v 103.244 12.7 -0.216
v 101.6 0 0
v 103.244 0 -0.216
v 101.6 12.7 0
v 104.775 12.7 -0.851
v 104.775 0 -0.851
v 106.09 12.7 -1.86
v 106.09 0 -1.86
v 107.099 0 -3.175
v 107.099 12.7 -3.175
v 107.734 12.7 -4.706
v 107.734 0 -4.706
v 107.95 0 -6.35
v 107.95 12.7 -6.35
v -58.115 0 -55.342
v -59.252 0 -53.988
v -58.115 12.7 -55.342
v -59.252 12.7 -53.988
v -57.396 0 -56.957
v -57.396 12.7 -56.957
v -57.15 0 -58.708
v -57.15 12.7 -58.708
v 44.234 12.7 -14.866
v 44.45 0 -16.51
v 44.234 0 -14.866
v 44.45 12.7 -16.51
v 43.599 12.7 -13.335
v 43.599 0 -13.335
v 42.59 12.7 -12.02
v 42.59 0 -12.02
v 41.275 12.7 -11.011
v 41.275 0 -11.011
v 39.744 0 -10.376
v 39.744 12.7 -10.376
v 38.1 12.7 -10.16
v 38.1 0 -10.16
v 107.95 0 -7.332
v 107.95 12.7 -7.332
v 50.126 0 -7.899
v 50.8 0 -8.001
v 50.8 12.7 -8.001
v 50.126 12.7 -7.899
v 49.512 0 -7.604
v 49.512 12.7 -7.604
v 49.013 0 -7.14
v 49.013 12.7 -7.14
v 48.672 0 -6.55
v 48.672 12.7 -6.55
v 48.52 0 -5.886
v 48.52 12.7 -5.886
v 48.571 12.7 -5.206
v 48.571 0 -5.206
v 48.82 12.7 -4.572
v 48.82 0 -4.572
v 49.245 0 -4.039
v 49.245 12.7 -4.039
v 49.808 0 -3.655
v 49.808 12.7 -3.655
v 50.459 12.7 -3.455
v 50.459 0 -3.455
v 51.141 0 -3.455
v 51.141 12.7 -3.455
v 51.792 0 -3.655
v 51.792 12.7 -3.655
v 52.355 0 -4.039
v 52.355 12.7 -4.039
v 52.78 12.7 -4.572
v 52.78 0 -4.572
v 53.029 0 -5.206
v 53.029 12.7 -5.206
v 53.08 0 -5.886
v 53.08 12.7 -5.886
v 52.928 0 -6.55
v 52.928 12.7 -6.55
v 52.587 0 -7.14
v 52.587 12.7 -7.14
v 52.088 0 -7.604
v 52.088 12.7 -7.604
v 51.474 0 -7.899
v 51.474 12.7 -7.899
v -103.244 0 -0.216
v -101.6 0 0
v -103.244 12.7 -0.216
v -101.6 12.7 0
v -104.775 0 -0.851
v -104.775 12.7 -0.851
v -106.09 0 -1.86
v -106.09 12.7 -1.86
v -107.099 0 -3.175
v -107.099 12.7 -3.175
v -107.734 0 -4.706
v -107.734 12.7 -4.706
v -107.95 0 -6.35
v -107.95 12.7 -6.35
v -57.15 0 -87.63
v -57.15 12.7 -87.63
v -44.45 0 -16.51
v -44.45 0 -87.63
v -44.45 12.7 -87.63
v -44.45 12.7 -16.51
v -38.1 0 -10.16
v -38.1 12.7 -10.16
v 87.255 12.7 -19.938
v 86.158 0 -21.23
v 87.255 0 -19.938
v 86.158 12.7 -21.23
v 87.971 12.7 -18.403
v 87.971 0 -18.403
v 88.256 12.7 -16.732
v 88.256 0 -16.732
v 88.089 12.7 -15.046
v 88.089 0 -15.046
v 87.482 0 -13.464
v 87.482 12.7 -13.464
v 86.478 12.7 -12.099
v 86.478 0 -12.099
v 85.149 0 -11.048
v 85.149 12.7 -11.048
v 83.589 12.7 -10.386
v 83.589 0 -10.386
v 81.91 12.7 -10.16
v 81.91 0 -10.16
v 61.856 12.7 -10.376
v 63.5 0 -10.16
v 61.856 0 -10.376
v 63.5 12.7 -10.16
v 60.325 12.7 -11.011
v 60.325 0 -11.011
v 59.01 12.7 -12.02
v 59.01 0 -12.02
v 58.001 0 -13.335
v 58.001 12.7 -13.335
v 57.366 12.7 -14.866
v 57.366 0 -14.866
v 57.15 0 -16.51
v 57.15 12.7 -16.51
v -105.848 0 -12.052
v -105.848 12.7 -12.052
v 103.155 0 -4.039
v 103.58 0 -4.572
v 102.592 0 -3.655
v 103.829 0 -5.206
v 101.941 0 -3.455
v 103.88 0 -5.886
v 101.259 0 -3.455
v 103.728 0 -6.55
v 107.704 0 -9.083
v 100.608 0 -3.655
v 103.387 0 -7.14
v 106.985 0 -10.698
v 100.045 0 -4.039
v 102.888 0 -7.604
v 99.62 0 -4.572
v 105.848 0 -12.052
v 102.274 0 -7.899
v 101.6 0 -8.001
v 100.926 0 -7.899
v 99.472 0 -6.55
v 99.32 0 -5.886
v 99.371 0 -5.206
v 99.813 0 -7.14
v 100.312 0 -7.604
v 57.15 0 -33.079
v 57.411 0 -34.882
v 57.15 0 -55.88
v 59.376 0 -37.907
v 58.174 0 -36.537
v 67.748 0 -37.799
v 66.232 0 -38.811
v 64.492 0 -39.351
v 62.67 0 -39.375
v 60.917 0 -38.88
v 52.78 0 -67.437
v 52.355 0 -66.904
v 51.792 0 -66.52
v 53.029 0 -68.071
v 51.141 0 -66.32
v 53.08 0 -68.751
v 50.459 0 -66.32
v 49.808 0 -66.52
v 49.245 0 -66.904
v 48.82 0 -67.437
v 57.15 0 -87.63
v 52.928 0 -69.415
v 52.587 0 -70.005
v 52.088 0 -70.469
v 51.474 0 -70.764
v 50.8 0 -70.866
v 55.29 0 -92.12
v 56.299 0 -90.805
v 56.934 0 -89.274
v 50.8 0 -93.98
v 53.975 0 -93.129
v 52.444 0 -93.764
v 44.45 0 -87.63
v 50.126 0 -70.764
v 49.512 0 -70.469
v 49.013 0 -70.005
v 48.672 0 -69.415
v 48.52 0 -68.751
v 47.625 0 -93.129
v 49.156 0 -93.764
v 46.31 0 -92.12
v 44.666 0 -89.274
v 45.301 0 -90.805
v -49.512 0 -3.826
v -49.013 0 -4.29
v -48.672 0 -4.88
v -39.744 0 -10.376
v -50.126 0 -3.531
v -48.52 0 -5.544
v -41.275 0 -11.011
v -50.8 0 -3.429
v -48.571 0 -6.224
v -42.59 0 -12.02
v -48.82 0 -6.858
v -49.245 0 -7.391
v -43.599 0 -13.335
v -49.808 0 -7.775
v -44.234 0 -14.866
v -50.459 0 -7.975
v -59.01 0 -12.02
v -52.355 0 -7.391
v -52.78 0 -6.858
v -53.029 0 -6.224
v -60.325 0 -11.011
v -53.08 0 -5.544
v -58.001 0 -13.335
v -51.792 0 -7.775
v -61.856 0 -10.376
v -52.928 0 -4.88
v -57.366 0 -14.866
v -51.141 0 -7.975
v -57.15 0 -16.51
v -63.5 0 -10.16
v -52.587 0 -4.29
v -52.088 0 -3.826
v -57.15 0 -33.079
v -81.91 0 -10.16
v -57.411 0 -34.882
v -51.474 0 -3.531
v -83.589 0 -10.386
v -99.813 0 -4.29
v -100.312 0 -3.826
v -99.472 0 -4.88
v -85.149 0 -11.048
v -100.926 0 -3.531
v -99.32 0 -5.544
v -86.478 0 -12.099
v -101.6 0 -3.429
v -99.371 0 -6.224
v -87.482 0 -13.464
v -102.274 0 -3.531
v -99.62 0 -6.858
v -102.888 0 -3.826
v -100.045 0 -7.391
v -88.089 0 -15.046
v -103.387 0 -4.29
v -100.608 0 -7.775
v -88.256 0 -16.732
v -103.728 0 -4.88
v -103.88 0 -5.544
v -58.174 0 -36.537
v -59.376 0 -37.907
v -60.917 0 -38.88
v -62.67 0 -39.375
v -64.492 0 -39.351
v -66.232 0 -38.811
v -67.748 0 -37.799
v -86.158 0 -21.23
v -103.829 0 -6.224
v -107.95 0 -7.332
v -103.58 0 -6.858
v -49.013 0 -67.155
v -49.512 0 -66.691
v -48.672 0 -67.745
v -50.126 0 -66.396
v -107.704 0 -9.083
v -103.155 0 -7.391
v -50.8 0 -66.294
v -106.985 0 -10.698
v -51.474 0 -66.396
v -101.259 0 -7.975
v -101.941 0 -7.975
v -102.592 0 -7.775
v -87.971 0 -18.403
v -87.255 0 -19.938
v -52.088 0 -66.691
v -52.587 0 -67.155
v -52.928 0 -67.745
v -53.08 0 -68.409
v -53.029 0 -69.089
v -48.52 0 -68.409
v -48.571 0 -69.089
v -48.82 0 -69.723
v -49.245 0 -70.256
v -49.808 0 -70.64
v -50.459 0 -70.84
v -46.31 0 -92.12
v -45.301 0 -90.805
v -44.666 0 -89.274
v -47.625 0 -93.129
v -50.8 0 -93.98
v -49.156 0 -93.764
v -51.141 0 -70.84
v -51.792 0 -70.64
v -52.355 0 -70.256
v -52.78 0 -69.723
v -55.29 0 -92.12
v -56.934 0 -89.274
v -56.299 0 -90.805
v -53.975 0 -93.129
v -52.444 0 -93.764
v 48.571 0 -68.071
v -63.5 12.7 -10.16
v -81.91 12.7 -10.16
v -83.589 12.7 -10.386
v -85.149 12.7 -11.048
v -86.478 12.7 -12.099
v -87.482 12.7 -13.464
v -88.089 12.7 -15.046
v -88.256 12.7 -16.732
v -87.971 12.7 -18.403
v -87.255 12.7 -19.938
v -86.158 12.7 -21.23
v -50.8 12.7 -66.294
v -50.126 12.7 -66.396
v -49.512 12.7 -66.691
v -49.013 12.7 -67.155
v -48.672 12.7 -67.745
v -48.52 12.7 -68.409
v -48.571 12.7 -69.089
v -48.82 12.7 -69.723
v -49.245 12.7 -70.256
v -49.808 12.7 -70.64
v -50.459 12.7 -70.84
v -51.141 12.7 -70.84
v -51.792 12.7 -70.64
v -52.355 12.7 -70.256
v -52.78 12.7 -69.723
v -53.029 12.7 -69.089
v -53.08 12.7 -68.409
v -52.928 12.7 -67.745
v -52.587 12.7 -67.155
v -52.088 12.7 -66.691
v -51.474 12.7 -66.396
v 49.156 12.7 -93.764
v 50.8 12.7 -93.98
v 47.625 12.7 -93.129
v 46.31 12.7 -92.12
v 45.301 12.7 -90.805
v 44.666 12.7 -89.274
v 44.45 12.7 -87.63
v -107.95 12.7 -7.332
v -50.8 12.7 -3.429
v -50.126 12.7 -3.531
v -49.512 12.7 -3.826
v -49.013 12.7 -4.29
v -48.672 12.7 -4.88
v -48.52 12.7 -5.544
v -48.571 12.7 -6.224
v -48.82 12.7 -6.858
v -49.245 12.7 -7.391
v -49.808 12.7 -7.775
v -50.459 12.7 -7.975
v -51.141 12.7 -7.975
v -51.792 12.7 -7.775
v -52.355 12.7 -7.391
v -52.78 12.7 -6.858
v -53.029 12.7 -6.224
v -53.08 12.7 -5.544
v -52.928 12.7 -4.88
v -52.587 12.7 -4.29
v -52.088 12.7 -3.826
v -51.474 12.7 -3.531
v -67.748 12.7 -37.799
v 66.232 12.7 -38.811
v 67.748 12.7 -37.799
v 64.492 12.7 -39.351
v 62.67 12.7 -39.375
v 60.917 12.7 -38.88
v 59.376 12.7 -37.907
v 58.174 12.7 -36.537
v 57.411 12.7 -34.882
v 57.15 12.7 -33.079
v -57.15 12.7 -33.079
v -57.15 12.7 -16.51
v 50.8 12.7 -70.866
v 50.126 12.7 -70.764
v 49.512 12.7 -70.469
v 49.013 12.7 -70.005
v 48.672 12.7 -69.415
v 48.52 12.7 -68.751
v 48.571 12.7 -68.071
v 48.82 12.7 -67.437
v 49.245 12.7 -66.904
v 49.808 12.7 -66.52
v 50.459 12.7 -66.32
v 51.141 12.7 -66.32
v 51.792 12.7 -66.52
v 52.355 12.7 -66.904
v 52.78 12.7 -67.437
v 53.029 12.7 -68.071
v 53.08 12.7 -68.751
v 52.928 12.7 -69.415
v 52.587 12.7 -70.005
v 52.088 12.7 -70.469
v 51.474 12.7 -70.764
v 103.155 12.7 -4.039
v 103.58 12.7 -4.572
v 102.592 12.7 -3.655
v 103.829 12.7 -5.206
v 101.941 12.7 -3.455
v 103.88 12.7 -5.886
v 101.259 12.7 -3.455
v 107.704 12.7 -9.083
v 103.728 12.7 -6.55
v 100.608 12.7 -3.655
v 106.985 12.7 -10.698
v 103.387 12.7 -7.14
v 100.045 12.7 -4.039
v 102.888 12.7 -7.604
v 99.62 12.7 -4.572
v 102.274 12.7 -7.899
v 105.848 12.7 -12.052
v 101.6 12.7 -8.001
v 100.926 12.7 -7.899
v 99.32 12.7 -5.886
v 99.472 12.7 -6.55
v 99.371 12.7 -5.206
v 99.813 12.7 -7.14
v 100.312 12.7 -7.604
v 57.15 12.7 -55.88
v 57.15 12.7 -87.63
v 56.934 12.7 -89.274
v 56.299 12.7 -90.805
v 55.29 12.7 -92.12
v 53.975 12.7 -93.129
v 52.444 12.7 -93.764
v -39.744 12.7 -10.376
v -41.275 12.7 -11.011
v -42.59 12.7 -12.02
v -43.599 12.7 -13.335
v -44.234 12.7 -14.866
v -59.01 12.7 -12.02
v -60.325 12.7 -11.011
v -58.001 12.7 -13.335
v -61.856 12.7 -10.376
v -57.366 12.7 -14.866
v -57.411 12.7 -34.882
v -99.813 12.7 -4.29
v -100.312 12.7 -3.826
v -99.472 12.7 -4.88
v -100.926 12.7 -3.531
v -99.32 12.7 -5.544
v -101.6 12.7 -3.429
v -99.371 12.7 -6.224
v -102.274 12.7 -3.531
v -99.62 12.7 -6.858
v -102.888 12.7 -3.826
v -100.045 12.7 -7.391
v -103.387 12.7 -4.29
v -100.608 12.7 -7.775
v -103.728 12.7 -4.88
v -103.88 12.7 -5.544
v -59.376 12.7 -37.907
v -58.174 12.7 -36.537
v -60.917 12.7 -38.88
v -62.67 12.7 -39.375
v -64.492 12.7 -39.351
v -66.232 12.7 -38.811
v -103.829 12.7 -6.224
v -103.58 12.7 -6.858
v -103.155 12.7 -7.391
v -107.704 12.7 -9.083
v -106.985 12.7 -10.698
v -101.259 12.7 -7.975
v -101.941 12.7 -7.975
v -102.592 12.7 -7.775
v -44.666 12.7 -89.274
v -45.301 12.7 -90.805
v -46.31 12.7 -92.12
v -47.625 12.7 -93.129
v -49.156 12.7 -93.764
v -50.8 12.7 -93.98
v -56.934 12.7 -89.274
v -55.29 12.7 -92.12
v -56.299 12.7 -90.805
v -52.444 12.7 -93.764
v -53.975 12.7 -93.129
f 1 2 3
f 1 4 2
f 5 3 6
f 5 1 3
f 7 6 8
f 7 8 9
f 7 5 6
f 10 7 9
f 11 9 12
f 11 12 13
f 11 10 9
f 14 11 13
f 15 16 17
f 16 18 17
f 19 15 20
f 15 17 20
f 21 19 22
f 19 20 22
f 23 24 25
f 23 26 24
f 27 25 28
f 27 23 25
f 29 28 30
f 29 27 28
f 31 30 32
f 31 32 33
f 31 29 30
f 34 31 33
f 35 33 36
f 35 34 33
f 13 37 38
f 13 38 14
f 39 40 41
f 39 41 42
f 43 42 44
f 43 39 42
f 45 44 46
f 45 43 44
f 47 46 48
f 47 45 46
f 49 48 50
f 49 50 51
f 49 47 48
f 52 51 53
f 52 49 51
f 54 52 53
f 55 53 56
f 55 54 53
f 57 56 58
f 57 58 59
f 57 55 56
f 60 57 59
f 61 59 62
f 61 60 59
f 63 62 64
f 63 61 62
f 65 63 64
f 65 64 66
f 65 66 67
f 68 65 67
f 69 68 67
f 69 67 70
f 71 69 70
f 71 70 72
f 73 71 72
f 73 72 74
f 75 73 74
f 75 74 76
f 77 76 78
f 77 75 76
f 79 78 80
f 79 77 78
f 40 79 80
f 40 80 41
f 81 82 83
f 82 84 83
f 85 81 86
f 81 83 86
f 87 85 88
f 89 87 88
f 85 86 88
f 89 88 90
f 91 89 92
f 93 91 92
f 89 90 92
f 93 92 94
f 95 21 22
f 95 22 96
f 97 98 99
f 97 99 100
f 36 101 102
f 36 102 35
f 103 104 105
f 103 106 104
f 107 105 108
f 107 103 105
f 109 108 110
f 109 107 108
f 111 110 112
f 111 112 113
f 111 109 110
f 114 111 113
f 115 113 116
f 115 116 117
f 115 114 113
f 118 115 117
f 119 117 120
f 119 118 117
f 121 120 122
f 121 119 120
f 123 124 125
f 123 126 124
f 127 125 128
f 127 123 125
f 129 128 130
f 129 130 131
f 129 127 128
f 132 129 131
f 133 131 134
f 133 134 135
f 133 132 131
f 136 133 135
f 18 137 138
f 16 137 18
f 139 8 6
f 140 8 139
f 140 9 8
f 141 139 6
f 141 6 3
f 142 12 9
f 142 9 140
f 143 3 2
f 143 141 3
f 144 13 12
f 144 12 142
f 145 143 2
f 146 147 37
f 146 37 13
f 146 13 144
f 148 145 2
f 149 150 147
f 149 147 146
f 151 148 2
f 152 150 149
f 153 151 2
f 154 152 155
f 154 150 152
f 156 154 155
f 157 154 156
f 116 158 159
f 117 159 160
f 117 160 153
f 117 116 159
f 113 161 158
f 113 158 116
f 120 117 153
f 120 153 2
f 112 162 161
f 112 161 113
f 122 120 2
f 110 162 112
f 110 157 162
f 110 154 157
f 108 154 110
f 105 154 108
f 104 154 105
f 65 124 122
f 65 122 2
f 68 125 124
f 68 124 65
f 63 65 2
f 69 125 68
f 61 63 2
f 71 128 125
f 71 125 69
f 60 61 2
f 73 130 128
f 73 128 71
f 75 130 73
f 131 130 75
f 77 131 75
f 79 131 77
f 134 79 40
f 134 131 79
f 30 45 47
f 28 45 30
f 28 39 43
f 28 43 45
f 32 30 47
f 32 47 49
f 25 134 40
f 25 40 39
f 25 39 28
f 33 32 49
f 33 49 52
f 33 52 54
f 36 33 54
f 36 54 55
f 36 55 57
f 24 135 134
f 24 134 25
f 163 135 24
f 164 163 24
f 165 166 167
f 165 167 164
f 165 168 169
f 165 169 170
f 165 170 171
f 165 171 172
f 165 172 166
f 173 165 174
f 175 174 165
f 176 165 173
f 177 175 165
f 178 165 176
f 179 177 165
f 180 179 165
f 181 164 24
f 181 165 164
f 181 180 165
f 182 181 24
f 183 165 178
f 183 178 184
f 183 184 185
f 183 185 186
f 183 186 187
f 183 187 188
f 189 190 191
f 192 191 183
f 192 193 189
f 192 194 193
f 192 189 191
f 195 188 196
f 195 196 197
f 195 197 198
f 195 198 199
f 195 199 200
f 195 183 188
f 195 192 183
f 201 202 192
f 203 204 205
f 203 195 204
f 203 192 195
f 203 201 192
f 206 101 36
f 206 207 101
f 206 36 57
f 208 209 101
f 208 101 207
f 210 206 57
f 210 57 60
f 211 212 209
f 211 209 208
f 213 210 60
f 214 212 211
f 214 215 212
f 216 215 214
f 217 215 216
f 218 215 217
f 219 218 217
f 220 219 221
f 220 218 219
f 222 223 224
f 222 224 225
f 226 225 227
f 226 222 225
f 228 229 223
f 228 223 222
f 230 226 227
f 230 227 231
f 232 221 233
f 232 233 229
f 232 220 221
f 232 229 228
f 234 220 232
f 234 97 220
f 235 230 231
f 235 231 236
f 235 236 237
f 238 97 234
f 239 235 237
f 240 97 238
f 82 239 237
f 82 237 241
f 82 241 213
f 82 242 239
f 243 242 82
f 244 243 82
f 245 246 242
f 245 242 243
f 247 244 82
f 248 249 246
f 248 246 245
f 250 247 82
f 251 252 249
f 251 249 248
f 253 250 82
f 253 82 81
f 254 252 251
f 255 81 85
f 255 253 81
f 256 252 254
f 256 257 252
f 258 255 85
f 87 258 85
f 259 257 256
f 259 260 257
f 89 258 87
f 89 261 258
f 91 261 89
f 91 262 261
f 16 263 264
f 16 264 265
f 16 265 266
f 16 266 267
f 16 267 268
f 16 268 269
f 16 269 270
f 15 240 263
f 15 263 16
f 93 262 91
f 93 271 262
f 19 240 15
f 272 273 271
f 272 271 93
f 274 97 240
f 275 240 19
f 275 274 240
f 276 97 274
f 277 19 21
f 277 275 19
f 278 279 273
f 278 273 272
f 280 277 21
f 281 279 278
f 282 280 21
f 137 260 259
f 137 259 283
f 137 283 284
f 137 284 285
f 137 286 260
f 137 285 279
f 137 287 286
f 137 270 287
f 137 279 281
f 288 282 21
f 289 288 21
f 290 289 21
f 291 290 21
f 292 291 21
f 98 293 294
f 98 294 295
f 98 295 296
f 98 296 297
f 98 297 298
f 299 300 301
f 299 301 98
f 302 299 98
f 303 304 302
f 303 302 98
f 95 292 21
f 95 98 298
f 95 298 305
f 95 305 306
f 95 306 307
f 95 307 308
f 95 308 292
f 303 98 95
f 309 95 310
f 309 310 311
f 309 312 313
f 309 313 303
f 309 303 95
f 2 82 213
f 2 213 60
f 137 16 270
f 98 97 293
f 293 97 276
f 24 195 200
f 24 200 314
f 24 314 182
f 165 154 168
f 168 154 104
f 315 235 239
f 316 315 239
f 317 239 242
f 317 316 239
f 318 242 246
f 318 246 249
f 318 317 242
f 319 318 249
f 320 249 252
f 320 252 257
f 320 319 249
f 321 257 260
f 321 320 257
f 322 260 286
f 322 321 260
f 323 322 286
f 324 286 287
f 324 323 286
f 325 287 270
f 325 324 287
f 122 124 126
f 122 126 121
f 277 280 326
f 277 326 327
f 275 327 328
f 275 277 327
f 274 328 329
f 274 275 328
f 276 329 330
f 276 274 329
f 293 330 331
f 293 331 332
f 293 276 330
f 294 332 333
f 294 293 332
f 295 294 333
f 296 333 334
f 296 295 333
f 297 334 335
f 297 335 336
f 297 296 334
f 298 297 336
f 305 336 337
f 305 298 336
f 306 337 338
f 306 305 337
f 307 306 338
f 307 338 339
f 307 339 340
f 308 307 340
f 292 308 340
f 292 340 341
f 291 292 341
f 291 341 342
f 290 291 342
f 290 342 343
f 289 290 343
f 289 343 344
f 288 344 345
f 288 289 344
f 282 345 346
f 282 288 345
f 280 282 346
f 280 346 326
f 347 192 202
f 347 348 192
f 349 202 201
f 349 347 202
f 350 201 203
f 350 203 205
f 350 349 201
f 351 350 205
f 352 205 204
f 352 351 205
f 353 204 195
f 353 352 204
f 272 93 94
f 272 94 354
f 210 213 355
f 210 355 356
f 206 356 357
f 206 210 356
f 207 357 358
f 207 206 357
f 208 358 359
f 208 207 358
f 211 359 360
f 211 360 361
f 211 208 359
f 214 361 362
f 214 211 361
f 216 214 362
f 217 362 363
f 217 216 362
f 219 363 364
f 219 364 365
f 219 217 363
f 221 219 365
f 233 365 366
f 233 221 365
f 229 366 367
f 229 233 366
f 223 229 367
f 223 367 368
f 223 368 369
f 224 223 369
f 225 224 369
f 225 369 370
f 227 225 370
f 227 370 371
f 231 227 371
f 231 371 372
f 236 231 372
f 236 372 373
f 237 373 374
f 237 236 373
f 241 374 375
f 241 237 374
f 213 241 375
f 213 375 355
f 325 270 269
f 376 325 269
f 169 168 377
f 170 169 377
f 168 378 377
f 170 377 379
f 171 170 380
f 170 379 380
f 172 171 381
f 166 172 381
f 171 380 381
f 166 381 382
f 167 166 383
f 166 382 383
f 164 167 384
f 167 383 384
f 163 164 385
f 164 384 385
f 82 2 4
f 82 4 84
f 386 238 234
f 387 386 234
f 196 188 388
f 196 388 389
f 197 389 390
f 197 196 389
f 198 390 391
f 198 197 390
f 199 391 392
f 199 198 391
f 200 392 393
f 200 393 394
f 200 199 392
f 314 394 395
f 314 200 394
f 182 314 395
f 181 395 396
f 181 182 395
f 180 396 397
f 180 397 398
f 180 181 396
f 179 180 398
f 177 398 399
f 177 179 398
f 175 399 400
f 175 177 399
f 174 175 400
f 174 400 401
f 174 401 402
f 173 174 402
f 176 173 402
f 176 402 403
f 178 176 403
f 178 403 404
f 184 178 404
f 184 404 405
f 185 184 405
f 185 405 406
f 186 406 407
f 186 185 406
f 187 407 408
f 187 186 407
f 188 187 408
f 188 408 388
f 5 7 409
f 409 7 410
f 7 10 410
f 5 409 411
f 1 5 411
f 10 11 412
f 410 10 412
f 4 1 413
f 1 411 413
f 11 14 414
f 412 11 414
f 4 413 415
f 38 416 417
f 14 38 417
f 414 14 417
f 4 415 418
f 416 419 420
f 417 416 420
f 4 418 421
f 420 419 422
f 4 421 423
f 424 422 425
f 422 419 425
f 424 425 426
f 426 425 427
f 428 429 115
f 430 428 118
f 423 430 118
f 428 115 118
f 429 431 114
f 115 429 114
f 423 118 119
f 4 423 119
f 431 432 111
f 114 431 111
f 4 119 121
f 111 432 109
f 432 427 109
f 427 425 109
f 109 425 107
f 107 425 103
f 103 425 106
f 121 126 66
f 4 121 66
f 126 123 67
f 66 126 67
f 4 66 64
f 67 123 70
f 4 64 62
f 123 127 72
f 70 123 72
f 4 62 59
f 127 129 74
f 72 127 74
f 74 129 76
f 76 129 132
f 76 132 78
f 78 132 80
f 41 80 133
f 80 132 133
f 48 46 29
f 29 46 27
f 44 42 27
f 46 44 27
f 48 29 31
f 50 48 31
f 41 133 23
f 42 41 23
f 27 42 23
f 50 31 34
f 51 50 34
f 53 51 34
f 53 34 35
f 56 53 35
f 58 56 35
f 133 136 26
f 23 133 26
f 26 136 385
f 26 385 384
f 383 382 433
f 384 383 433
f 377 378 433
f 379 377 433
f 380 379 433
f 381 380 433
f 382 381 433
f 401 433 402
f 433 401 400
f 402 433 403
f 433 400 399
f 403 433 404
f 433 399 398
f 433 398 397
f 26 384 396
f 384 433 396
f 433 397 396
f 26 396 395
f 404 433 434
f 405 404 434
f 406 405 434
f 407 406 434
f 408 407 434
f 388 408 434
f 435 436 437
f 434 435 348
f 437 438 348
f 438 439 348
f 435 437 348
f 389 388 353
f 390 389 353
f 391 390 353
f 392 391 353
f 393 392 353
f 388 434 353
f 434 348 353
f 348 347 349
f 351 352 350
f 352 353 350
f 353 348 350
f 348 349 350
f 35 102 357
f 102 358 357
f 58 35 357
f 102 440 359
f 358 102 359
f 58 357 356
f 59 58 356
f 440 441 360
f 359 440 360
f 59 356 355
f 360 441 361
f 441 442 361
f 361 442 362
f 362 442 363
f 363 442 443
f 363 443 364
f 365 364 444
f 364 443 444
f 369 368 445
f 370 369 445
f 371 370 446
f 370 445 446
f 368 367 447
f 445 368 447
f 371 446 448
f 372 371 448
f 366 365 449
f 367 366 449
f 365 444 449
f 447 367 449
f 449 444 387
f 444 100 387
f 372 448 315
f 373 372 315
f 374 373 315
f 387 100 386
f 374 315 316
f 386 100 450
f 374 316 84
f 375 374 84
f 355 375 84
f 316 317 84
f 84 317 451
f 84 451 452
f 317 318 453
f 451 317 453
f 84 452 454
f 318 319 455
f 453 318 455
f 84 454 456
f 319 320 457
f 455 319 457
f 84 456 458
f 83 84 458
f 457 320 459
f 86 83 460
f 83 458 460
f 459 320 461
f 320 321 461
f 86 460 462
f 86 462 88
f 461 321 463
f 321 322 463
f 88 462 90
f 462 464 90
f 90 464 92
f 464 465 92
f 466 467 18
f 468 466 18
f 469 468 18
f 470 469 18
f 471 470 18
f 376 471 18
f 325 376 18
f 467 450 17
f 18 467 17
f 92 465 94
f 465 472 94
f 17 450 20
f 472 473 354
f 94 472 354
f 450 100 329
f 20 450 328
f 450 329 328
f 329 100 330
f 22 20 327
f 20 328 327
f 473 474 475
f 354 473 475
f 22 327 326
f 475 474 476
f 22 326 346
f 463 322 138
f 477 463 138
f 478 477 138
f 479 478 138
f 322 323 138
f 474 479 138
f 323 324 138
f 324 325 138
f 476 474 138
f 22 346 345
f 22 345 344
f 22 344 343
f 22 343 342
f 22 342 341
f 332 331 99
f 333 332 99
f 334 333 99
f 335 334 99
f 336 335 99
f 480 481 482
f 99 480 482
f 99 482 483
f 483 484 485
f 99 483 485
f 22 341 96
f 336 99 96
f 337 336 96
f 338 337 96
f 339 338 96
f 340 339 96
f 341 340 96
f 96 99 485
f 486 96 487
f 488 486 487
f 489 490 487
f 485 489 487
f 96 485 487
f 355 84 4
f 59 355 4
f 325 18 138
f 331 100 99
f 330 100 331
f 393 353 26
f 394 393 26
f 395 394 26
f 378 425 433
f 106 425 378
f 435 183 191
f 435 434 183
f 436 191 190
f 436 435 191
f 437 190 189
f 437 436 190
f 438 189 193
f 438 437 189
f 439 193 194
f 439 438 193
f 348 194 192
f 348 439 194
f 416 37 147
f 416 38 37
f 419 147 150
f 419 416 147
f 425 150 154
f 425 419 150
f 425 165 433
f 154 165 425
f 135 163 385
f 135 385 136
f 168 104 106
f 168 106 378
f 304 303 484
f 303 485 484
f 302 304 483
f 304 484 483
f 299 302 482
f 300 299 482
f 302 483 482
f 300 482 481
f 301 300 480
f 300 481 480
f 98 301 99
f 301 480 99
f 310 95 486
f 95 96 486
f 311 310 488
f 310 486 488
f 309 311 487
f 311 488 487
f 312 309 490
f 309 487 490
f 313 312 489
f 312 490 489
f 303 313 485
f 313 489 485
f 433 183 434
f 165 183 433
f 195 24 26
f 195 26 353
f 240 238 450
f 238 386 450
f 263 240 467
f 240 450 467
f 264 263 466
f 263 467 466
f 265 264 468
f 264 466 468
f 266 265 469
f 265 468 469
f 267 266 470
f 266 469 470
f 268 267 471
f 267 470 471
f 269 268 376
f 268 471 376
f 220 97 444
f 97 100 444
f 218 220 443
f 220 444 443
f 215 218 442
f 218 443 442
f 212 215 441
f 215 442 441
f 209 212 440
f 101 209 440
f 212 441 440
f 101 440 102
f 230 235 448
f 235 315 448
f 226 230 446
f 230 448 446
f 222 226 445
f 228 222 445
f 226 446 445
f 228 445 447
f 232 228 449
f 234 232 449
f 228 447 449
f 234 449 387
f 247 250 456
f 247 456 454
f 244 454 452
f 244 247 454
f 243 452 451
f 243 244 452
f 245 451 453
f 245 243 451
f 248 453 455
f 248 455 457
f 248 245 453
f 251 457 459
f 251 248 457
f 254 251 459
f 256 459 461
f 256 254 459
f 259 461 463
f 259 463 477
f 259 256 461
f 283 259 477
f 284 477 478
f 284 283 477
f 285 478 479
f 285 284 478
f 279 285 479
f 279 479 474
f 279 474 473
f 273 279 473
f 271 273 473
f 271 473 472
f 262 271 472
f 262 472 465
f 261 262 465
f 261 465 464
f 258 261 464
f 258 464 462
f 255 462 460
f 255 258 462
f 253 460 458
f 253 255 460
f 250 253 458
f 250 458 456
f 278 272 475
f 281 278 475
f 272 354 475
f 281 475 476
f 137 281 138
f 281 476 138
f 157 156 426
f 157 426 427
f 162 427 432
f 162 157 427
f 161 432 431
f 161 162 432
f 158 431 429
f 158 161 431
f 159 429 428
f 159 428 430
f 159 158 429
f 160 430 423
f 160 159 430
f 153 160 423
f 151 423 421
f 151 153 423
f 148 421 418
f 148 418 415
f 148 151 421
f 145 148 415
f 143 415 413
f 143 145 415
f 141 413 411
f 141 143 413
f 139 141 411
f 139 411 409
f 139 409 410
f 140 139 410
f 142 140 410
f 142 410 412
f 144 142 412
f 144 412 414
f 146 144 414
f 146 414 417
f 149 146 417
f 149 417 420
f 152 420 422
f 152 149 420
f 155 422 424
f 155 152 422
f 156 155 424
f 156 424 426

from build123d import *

# Parameters (mm, degrees)
SKETCH2_R           = 2.286
BOSS_EXTRUDE1_DEPTH = 12.7
FILLET1_R           = 6.35


with BuildPart() as part:
    # Sketch2 → Boss-Extrude1 (new body)
    with BuildSketch(Plane(origin=(0, 0, 0), x_dir=(1, 0, 0), z_dir=(0, 1, 0))):
        Polygon((107.95, 0), (-107.95, 0), (-107.95, 10.16), (-57.15, 55.88), (-57.15, 93.98), (-44.45, 93.98), (-44.45, 10.16), (44.45, 10.16), (44.45, 93.98), (57.15, 93.98), (57.15, 55.88), (107.95, 10.16), align=None)
        with Locations(Location((-50.8, 68.58, 0), (0, 0, 270))):
            Circle(SKETCH2_R, mode=Mode.SUBTRACT)
        with Locations(Location((50.8, 68.58, 0), (0, 0, 90))):
            Circle(SKETCH2_R, mode=Mode.SUBTRACT)
        with Locations(Location((-101.6, 5.715, 0), (0, 0, 270))):
            Circle(SKETCH2_R, mode=Mode.SUBTRACT)
        with Locations(Location((-50.8, 5.715, 0), (0, 0, 270))):
            Circle(SKETCH2_R, mode=Mode.SUBTRACT)
        with Locations(Location((101.6, 5.715, 0), (0, 0, 90))):
            Circle(SKETCH2_R, mode=Mode.SUBTRACT)
        with Locations(Location((50.8, 5.715, 0), (0, 0, 90))):
            Circle(SKETCH2_R, mode=Mode.SUBTRACT)
        Polygon((-57.15, 10.16), (-98.457720811, 10.16), (-57.15, 47.33694873), align=None, mode=Mode.SUBTRACT)
        Polygon((57.15, 47.33694873), (57.15, 10.16), (98.457720811, 10.16), align=None, mode=Mode.SUBTRACT)
    extrude(amount=BOSS_EXTRUDE1_DEPTH)

    # Fillet1
    fillet1_edges = [part.edges().sort_by_distance(p)[0] for p in [
        (57.15, 6.35, -93.98),
        (44.45, 6.35, -93.98),
        (-44.45, 6.35, -93.98),
        (-57.15, 6.35, -93.98),
        (-107.95, 6.35, -10.16),
        (-107.95, 6.35, 0),
        (107.95, 6.35, -10.16),
        (107.95, 6.35, 0),
        (98.457720811, 6.35, -10.16),
        (57.15, 6.35, -47.33694873),
        (57.15, 6.35, -10.16),
        (44.45, 6.35, -10.16),
        (-44.45, 6.35, -10.16),
        (-57.15, 6.35, -10.16),
        (-98.457720811, 6.35, -10.16),
        (-57.15, 6.35, -47.33694873),
        (-57.15, 6.35, -55.88),
    ]]
    fillet(fillet1_edges, radius=FILLET1_R - 0.0001)  # a hair under: the kernel refuses the full size


solid = part.part
